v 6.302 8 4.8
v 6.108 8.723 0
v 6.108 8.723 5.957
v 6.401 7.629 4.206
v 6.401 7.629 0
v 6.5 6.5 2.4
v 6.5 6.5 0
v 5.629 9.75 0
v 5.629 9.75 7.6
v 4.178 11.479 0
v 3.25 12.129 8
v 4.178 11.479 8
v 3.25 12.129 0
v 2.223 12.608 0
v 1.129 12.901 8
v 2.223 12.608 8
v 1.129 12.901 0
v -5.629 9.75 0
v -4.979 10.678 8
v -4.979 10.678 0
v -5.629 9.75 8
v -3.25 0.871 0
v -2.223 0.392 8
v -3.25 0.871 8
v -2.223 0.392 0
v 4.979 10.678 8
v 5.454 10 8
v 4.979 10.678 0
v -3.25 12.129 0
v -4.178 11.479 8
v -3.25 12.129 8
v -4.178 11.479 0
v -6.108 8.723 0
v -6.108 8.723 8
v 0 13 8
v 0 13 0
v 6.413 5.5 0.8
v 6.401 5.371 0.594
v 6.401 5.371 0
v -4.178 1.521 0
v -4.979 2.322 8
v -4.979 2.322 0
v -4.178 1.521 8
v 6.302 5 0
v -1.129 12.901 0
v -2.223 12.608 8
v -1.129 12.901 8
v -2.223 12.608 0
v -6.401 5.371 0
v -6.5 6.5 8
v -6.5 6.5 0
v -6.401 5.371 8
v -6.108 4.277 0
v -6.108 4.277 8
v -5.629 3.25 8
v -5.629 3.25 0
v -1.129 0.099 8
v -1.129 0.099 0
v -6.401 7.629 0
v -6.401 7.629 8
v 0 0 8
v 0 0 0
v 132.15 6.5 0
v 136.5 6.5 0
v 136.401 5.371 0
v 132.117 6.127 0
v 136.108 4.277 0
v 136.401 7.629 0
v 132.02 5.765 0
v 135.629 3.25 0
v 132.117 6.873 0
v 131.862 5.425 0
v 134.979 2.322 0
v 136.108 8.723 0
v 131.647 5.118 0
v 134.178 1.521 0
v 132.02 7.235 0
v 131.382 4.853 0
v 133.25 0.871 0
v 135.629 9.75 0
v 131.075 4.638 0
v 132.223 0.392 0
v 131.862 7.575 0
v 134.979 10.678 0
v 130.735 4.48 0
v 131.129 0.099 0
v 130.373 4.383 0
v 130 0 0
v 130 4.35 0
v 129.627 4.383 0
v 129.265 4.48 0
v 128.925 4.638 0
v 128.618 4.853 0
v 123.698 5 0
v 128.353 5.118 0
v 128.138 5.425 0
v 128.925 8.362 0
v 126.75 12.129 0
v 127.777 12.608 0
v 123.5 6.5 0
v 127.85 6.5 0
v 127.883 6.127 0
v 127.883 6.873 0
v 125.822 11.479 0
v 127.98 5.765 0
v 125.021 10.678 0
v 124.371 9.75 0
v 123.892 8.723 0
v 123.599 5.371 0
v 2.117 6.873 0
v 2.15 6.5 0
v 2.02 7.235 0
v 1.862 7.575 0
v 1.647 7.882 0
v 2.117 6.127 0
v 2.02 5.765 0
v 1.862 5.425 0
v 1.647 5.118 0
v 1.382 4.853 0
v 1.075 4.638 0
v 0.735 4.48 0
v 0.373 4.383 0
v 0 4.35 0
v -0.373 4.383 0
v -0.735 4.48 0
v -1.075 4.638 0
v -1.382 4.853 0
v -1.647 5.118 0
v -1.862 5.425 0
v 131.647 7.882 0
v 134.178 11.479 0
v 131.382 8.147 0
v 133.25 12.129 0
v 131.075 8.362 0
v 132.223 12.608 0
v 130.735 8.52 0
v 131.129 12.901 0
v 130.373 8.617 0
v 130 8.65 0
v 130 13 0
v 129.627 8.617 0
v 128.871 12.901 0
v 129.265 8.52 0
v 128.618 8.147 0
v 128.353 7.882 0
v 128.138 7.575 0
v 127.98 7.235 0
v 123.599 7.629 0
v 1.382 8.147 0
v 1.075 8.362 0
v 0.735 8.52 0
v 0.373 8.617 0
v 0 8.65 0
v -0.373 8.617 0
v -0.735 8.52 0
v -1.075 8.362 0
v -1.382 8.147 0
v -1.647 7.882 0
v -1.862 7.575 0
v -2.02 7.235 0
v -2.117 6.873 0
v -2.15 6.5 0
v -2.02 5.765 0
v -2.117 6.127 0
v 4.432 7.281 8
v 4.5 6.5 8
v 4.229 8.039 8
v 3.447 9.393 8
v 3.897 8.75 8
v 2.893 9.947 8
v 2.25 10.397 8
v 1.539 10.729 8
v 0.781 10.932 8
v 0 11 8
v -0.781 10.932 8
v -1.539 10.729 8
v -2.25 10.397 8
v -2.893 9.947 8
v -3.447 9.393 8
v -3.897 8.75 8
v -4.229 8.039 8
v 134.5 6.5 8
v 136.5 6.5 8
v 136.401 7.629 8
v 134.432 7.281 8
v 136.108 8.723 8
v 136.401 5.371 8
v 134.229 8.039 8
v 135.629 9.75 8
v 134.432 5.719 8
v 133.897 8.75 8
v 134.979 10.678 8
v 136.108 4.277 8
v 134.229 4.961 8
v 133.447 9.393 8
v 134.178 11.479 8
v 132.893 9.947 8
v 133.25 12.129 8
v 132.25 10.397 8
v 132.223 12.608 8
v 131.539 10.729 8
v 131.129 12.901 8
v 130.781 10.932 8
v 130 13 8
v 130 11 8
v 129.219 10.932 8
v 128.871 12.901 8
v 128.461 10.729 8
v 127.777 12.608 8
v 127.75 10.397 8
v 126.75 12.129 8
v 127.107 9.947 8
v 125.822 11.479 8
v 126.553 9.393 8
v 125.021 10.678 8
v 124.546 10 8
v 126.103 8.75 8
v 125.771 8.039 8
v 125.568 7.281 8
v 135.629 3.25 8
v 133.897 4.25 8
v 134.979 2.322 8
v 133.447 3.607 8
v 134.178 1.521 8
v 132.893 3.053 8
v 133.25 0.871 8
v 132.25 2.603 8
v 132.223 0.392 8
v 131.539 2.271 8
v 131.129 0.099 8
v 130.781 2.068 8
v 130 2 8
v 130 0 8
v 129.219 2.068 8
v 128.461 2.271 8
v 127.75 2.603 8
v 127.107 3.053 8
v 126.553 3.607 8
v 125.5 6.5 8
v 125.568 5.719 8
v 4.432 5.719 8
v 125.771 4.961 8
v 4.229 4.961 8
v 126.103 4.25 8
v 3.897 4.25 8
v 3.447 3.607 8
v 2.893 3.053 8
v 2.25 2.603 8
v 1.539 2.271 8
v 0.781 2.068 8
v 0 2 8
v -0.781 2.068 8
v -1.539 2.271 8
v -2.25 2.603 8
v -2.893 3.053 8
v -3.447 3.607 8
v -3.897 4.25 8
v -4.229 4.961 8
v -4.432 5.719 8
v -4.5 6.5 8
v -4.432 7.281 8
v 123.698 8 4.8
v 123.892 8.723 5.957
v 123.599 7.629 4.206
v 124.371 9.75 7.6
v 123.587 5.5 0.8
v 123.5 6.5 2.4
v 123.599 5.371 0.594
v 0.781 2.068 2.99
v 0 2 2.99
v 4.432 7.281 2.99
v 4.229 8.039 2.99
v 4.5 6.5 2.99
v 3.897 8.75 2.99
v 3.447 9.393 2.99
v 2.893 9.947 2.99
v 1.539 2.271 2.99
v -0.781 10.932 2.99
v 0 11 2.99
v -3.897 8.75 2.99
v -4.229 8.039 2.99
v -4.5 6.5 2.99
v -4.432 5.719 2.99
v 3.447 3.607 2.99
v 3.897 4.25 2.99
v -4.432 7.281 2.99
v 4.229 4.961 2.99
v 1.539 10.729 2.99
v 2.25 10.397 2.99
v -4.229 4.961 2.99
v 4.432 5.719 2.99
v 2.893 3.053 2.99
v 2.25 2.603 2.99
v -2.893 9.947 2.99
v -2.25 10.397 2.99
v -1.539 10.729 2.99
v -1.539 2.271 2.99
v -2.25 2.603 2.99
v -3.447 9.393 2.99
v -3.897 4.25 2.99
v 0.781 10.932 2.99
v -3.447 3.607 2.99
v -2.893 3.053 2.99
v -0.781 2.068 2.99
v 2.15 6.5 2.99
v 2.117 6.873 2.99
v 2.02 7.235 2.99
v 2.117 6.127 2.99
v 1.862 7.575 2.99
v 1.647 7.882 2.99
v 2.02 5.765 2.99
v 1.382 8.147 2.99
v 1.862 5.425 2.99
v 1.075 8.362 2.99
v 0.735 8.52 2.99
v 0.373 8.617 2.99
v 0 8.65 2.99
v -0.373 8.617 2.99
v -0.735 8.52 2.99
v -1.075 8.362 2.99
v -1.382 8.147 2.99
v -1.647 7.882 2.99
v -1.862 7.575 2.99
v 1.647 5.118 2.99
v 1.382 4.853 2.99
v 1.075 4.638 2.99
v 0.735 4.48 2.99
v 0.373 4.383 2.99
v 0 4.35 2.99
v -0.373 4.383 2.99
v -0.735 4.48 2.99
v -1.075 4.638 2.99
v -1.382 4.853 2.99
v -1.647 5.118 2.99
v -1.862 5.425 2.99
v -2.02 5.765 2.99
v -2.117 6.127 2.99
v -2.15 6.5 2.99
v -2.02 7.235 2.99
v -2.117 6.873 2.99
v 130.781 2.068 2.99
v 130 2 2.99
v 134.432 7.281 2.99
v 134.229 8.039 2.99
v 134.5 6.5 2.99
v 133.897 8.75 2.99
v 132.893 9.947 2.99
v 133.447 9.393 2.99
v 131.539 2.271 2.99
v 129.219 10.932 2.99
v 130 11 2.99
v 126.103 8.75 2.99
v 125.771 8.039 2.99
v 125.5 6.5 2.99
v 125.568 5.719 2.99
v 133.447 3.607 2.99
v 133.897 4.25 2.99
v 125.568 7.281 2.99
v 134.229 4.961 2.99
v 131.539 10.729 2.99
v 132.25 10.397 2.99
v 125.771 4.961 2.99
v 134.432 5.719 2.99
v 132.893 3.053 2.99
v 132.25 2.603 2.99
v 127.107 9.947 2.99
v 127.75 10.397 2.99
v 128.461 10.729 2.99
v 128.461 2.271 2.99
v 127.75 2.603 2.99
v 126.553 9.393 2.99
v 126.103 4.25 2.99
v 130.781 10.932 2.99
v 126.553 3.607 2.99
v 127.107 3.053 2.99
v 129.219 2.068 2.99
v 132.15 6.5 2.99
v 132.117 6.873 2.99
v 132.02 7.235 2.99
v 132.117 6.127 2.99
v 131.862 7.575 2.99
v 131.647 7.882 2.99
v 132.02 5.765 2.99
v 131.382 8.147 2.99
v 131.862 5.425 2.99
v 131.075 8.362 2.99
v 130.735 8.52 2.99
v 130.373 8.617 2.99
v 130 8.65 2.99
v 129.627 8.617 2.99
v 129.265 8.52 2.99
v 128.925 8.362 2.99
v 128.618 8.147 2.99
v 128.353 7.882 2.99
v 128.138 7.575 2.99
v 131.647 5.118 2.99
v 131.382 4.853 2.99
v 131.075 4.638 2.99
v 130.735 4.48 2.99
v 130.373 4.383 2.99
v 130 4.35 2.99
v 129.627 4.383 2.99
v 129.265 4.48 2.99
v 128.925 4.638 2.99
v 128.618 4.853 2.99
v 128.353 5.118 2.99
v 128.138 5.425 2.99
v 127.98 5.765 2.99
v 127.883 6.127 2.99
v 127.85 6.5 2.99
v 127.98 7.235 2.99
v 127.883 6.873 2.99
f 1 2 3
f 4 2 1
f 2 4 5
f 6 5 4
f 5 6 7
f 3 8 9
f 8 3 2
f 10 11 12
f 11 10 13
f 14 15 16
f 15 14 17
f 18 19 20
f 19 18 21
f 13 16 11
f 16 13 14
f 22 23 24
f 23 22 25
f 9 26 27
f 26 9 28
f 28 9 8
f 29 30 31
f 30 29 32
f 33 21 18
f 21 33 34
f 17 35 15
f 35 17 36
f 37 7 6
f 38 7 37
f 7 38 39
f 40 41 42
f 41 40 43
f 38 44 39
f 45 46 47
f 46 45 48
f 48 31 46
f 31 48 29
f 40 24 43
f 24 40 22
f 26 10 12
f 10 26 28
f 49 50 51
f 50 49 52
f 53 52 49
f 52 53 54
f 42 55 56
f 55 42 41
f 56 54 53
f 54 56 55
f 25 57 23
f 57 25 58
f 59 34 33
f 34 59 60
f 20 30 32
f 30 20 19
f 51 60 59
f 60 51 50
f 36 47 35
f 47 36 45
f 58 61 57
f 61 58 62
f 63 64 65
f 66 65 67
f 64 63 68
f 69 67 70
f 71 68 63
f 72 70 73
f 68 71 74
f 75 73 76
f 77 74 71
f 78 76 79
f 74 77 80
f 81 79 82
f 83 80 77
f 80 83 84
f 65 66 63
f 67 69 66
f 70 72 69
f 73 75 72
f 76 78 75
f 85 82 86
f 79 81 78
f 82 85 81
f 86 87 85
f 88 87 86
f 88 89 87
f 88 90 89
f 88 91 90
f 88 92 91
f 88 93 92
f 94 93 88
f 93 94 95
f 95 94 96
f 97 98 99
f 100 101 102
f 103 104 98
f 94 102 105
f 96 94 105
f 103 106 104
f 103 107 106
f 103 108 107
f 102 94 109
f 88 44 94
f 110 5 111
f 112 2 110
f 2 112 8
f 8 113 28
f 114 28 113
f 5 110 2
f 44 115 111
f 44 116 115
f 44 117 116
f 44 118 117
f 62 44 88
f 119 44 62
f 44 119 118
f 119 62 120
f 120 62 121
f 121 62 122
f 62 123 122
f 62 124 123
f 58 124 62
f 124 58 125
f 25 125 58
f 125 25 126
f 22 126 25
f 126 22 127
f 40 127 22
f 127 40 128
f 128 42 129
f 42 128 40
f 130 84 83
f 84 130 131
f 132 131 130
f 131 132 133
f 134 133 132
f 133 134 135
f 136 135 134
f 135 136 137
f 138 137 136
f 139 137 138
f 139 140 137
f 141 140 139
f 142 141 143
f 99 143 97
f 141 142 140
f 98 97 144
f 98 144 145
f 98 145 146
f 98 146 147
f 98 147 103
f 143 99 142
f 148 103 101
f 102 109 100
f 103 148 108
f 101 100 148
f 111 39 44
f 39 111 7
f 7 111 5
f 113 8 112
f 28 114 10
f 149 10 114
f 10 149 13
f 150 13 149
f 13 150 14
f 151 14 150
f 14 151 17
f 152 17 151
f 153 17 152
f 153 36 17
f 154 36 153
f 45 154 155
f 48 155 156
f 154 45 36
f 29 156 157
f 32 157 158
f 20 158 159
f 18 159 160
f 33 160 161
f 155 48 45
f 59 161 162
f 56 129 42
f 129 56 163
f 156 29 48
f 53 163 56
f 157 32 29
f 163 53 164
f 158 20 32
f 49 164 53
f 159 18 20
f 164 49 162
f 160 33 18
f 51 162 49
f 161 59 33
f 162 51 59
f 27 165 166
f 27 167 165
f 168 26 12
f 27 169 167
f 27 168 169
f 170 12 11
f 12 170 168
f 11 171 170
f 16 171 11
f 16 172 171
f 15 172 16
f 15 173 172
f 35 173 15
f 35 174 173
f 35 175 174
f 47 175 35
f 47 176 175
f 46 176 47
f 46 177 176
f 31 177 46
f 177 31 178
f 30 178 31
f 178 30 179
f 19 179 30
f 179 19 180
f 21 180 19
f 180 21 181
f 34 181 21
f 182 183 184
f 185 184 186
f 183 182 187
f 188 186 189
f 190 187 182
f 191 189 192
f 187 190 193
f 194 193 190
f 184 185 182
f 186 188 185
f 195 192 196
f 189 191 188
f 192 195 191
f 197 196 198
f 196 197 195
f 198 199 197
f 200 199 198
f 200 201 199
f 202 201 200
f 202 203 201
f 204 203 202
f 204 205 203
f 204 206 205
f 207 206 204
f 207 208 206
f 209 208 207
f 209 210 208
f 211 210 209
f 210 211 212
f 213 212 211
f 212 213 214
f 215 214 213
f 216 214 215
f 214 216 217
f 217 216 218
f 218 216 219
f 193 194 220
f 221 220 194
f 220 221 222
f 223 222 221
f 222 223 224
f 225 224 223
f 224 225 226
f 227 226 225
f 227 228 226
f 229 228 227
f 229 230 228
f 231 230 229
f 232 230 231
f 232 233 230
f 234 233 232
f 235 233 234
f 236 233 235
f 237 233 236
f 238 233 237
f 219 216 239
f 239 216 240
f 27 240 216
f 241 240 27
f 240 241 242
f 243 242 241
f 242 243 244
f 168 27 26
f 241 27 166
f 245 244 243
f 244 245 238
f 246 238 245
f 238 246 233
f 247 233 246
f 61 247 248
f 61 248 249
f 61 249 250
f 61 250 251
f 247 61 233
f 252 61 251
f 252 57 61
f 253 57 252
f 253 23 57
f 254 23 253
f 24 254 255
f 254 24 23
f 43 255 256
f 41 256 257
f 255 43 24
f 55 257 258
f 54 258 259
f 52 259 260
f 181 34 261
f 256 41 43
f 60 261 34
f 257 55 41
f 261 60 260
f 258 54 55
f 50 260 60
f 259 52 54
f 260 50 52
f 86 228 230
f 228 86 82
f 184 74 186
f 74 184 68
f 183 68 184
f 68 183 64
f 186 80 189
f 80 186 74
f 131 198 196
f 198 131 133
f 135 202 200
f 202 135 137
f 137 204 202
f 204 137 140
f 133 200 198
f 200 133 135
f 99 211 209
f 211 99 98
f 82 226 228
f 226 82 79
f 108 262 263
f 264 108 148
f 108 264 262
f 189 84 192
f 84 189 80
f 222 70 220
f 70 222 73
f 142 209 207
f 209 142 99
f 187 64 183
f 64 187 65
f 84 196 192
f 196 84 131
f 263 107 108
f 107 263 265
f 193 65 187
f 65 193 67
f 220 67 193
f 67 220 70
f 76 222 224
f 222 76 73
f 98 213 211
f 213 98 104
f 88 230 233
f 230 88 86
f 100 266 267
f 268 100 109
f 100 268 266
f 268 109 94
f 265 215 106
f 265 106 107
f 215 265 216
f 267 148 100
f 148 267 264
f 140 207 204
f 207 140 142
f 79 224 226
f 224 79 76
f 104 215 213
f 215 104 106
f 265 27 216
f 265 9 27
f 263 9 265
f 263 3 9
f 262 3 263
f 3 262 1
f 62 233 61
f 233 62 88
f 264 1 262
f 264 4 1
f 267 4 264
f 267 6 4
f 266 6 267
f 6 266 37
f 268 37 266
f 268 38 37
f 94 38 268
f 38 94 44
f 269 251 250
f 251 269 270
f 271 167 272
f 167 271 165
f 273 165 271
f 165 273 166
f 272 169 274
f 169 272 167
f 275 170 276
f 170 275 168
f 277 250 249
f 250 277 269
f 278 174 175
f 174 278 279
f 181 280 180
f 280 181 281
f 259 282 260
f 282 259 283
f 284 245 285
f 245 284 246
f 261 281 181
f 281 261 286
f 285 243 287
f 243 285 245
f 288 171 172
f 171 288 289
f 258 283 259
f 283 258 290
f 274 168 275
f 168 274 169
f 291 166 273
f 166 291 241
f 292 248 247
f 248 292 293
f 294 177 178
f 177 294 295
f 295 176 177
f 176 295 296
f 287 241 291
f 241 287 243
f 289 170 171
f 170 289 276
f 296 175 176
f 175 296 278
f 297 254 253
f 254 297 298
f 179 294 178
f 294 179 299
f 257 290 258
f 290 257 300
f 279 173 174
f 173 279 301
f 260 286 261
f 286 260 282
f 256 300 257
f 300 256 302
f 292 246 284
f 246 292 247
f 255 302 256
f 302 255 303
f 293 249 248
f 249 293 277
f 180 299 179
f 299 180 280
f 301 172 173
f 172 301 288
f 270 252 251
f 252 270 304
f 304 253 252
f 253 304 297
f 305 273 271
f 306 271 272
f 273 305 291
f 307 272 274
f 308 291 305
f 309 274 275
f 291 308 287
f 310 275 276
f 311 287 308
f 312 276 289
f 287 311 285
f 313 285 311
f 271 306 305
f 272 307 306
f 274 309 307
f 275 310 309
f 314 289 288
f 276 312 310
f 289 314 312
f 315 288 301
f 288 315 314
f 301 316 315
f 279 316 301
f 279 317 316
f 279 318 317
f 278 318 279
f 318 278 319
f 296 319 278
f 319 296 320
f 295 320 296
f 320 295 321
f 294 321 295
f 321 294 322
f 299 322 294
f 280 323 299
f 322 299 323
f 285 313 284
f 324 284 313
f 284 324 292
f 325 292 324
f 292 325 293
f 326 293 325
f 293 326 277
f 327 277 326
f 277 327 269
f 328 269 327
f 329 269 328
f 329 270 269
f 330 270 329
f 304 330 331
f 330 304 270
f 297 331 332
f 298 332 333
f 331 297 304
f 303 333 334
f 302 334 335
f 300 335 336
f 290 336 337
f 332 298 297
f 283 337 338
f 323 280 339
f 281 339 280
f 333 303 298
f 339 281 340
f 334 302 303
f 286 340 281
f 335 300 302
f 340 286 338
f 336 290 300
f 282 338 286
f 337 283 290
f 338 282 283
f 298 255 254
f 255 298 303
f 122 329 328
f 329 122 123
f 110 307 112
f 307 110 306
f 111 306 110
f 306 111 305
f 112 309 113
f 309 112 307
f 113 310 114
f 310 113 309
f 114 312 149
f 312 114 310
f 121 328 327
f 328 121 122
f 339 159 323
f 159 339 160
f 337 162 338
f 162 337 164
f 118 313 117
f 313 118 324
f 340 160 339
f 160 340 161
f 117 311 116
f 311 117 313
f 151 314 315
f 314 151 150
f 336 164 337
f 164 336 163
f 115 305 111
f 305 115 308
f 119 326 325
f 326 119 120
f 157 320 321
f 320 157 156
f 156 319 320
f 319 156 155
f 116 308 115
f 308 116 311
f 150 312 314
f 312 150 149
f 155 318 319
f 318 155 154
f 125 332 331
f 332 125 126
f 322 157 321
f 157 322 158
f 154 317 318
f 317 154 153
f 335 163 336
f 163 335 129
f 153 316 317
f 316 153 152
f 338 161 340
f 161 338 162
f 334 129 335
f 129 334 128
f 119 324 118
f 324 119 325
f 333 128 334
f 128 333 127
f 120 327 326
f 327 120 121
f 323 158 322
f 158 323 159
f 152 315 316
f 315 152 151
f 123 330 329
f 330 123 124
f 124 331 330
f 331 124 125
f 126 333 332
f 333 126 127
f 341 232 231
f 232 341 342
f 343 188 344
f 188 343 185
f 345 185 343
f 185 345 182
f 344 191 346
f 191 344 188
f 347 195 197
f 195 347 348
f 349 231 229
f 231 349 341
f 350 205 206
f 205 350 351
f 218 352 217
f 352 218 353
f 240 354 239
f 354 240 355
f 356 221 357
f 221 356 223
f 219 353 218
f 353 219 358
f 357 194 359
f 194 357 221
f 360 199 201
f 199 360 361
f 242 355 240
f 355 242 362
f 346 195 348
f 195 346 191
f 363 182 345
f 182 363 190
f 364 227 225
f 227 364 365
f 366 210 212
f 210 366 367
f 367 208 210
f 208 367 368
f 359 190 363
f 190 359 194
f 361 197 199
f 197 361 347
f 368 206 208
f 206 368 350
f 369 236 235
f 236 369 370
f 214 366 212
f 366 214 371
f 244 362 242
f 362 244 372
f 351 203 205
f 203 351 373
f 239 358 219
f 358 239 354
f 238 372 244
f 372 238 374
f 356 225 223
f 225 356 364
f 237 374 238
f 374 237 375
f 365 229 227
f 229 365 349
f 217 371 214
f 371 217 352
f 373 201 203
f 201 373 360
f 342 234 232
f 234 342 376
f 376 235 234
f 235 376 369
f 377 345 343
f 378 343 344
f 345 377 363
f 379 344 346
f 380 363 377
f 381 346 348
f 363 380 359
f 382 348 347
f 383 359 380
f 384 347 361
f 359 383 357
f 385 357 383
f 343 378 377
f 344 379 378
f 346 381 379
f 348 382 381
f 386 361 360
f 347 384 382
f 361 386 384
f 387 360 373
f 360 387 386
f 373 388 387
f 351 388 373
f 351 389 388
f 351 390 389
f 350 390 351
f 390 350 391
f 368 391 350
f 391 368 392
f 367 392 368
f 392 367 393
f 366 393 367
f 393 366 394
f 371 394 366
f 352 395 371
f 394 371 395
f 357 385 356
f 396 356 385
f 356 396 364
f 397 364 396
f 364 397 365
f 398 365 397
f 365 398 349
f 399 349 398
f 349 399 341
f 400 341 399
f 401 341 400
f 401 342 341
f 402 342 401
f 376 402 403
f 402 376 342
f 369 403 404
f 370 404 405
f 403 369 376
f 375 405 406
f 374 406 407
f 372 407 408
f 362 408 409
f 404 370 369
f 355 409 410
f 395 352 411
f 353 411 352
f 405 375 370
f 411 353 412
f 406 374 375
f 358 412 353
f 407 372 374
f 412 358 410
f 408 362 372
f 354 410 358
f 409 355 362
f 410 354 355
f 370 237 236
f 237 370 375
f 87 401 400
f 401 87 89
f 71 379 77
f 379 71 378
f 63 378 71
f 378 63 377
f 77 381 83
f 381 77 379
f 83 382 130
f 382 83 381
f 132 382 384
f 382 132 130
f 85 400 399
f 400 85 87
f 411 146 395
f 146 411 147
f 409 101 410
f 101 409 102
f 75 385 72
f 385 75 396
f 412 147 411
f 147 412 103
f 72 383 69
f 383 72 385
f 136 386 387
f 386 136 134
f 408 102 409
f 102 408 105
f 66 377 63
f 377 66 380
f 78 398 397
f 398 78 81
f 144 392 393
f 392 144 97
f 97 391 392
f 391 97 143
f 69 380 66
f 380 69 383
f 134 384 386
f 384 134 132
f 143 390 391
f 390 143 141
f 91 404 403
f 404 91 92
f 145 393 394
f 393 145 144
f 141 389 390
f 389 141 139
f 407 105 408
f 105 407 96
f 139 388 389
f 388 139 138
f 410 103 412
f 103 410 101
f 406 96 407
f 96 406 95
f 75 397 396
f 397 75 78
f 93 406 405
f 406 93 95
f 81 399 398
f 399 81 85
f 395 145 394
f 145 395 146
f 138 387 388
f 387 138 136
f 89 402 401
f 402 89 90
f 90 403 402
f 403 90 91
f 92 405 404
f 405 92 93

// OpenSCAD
use <tubemesh.scad>;

length = 130;
thickness = 8;
minWidth = 5;
maxWidth = 10;
plasticThicknessBelowScrew = 3;
sizeAroundCountersink = 2;
countersinkDiameter = 9;
countersinkDepth = 3;
screwHoleDiameter = 4.3;

module dummy() {}

nudge = 0.01;

module pull() {
    section0 = [ [0,0], [length,0], [length,minWidth], [0, minWidth] ];
    section1 = [ [0,0], [length,0], [length,maxWidth], [0, maxWidth] ];
    morphExtrude(section0,section1,thickness);
}

$fn = 36;
h1 = max(plasticThicknessBelowScrew+countersinkDepth,thickness);
module screwHole() {
    translate([0,0,-nudge]) {
        translate([0,0,plasticThicknessBelowScrew])
        cylinder(d=countersinkDiameter,h=countersinkDepth+2*nudge+thickness);
        cylinder(d=screwHoleDiameter,h=h1+nudge);
    }
}

render(convexity=2)
difference() {
    d1 = 2*sizeAroundCountersink+countersinkDiameter;
    union() {
        pull();
        for (i=[0:1])
            translate([i*length,d1/2,0])
        cylinder(d=d1,h1);
    }
    for (i=[0:1])
        translate([i*length,d1/2,0]) screwHole();

}
